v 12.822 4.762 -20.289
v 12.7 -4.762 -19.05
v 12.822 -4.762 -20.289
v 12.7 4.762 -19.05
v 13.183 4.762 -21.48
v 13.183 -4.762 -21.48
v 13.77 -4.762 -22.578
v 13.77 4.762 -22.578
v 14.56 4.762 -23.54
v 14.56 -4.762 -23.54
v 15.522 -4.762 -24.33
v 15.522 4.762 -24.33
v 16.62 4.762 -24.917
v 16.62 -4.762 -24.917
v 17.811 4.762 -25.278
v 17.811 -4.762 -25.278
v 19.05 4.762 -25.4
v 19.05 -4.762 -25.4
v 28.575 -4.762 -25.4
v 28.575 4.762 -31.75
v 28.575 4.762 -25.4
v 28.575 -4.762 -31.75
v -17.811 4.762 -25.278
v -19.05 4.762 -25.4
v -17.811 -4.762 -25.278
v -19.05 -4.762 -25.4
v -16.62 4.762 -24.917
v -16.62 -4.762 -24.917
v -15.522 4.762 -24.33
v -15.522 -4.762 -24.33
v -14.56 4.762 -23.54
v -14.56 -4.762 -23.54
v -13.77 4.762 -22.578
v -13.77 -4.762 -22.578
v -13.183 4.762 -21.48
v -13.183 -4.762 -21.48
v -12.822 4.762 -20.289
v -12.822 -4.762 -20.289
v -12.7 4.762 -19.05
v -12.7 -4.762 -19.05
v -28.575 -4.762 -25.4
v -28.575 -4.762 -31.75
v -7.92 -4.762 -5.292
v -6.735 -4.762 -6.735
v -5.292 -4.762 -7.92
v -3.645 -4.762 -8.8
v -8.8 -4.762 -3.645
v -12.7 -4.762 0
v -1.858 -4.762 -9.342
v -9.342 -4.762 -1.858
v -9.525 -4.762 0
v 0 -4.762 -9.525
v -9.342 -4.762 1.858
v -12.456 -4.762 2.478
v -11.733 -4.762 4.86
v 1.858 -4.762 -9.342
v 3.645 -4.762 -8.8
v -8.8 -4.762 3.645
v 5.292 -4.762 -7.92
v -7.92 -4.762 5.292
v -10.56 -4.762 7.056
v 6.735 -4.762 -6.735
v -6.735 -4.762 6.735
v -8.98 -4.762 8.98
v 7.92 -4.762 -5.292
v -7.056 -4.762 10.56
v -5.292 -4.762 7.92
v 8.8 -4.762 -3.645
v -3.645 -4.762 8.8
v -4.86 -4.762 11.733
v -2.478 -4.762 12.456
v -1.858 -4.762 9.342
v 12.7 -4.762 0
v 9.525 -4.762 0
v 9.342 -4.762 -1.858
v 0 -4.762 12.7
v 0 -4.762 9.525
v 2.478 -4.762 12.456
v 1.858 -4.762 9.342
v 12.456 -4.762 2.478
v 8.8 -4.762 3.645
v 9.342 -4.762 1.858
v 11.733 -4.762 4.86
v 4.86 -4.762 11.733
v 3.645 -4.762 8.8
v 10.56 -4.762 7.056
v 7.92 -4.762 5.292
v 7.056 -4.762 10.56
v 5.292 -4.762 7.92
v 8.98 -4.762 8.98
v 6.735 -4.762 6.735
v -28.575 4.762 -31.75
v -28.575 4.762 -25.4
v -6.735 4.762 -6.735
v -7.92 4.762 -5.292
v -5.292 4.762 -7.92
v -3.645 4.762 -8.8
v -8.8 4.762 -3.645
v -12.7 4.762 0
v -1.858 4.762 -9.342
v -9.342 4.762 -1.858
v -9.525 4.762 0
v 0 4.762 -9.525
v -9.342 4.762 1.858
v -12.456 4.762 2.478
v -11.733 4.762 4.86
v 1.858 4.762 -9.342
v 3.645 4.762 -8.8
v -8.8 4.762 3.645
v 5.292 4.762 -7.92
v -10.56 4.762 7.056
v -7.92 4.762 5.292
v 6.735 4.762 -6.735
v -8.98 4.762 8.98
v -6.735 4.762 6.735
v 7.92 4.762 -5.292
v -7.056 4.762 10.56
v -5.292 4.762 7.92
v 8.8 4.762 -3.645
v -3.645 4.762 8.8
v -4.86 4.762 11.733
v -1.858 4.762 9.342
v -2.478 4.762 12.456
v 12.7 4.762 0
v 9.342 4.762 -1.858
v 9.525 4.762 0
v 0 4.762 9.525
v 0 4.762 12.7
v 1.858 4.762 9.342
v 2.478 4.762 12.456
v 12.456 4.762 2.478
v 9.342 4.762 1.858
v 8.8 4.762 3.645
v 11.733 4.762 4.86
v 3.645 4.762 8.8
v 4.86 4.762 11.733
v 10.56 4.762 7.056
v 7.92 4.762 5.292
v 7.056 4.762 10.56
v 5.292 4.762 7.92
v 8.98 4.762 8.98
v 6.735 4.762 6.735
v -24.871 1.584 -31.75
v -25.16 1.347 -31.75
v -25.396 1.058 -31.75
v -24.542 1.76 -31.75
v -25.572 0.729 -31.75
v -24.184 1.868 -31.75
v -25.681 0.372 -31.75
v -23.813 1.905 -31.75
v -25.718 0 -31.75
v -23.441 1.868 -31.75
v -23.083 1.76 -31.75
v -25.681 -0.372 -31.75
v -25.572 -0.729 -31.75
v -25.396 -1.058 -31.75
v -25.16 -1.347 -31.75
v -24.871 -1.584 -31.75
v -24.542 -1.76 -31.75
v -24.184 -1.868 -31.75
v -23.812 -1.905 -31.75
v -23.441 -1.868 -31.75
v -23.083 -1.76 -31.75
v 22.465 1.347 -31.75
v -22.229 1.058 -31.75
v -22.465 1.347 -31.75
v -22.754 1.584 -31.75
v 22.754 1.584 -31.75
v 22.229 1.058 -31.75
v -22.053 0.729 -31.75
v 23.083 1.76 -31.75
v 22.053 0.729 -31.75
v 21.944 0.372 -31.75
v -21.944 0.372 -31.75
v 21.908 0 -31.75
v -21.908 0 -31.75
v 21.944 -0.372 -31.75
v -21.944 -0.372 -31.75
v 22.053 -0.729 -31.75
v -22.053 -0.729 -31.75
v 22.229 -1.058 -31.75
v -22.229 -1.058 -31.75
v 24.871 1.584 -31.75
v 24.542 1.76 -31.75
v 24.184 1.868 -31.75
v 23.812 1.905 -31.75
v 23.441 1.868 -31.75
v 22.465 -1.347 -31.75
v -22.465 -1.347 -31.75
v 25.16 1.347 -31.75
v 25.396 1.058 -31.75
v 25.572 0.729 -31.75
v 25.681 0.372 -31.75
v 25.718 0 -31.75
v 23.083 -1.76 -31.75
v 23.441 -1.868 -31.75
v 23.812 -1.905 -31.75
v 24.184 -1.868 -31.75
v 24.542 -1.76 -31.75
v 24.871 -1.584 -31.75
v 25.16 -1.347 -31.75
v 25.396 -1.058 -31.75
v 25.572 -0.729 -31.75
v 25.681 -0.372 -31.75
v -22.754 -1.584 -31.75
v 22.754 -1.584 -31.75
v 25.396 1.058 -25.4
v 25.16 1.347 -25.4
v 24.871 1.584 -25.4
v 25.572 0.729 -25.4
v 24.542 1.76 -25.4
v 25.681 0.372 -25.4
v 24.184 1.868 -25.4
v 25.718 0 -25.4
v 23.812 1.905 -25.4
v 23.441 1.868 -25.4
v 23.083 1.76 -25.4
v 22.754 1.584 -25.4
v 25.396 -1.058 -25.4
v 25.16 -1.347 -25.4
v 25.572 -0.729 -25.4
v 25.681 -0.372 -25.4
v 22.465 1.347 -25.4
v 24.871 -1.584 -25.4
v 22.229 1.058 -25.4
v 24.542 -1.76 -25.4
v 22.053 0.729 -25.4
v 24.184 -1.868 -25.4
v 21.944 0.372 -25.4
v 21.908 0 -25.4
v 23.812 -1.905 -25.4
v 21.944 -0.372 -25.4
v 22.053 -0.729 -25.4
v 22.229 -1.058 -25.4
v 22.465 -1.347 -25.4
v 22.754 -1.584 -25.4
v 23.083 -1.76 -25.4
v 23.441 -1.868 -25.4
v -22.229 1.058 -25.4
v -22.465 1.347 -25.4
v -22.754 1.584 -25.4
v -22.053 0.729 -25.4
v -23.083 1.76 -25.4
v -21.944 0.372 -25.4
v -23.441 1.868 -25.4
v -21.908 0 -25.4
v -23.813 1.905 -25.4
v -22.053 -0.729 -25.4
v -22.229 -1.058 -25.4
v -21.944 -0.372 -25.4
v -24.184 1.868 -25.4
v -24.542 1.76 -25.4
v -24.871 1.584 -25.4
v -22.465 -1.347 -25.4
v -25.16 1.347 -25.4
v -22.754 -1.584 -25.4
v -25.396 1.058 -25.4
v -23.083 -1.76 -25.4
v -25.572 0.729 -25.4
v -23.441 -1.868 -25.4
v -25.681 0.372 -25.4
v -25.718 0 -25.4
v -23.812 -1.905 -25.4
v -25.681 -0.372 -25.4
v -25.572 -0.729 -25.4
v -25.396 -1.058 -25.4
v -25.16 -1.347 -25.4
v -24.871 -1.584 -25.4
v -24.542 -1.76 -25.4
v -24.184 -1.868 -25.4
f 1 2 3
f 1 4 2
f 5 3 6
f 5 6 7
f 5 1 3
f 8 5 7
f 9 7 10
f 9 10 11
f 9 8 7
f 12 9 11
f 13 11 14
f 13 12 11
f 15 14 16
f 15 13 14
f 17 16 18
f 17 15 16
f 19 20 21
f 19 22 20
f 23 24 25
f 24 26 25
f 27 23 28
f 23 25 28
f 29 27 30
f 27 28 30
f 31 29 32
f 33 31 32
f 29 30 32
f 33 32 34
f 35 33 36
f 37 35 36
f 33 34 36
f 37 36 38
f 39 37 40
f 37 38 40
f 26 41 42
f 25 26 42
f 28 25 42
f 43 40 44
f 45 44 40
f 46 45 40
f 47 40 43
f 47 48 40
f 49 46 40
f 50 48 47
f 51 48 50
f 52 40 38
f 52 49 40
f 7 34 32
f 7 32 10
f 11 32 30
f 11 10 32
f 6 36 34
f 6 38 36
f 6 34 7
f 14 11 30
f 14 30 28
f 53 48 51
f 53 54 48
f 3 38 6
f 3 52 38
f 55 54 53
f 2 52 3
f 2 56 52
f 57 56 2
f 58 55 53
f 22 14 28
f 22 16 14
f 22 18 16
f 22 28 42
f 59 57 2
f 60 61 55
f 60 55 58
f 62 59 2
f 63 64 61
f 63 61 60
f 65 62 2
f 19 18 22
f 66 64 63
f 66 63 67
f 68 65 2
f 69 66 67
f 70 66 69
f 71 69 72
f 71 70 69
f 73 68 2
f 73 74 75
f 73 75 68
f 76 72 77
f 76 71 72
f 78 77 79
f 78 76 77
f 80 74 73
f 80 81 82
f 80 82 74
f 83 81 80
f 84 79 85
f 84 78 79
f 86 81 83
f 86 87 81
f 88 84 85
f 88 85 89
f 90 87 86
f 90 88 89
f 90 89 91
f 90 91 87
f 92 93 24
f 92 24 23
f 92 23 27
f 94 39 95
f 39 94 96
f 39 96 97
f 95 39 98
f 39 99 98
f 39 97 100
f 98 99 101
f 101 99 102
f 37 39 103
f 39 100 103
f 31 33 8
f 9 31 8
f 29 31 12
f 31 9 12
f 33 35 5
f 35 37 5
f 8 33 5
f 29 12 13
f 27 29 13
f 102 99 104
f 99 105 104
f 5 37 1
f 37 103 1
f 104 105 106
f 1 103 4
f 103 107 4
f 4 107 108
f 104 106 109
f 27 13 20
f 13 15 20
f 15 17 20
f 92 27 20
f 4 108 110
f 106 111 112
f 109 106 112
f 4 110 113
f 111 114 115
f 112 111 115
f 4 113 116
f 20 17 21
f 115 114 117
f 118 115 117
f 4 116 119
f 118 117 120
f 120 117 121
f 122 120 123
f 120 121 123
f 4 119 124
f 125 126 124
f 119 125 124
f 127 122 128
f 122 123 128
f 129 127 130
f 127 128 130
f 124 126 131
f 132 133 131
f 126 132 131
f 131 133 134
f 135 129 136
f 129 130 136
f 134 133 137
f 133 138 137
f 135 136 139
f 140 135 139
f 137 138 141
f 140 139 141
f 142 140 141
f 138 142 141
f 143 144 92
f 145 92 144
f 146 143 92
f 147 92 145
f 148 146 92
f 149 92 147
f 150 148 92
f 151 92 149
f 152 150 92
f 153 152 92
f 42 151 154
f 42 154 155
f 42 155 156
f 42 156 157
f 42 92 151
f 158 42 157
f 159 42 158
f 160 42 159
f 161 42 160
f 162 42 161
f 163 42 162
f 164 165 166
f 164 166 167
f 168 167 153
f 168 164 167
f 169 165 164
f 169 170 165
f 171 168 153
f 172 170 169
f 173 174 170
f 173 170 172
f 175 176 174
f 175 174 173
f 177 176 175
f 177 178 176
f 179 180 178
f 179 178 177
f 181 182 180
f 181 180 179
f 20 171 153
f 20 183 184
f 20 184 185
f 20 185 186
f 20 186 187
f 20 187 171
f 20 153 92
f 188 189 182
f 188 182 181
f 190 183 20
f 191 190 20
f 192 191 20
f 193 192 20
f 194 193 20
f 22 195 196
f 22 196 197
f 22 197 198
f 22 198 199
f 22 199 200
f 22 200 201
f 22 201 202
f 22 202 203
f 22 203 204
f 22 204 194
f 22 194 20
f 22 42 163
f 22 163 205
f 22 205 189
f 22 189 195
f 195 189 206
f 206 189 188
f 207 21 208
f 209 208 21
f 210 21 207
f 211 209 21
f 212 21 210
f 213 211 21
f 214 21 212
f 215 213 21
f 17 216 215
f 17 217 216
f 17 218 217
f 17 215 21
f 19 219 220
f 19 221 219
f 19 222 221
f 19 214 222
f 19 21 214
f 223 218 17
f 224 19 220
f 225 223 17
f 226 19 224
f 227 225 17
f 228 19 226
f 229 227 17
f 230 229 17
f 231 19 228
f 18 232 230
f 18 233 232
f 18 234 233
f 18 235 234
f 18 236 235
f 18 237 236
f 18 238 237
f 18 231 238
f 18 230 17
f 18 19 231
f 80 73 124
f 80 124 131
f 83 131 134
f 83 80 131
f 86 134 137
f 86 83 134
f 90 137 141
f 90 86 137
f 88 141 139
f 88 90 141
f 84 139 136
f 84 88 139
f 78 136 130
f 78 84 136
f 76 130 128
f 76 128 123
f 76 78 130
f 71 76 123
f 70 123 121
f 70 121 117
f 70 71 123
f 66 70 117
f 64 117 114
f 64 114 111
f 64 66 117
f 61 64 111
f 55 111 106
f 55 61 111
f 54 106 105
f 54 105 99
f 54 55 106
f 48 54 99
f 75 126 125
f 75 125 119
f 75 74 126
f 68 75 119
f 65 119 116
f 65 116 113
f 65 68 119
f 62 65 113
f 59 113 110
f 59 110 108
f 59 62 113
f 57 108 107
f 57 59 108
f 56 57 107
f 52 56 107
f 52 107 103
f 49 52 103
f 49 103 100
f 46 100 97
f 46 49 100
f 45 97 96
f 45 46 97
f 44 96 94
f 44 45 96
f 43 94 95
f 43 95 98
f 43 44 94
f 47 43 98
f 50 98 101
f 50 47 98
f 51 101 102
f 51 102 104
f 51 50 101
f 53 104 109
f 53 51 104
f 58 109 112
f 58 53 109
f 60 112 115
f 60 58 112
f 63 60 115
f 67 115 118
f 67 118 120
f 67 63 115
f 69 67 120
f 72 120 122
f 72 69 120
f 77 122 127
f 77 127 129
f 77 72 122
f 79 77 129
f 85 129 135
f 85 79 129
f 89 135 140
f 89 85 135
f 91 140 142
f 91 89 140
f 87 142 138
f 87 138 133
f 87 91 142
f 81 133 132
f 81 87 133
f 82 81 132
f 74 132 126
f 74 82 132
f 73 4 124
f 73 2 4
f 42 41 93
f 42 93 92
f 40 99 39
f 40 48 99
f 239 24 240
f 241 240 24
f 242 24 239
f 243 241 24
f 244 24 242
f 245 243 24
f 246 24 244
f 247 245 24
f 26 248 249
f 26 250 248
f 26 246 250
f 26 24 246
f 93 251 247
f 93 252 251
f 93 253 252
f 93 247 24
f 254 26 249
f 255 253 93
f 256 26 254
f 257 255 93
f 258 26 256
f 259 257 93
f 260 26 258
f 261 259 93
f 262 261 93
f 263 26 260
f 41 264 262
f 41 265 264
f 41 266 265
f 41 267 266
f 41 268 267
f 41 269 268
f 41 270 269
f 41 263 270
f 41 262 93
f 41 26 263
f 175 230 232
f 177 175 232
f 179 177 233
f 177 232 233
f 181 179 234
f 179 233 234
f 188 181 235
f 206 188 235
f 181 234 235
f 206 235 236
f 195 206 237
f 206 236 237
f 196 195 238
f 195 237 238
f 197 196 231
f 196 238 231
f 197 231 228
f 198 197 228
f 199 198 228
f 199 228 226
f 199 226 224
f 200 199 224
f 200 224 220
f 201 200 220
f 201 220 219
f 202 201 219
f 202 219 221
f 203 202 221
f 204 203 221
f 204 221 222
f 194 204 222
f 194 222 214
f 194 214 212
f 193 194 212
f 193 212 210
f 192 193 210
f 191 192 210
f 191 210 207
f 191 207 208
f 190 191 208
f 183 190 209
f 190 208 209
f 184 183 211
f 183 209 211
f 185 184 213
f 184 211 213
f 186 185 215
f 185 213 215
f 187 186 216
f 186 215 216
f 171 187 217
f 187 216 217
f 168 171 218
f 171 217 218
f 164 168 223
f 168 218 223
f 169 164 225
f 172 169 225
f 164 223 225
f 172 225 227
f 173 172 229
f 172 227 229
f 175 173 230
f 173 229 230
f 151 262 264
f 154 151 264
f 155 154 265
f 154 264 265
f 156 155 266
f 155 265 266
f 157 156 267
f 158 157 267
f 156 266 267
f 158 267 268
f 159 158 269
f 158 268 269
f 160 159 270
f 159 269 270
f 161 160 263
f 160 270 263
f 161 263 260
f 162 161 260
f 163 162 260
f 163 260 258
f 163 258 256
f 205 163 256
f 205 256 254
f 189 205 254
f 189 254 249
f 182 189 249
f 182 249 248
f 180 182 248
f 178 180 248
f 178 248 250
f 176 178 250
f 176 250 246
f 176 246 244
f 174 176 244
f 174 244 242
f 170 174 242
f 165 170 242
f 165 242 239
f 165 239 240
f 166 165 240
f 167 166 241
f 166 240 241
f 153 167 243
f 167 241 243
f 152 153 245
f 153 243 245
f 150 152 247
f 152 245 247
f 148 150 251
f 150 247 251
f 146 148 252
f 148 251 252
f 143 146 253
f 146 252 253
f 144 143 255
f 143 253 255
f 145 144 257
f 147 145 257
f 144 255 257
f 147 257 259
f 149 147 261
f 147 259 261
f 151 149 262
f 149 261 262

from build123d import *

# Parameters (mm, degrees)
F1_DEPTH = 4.7625
F2_R     = 6.35
F4_D     = 3.81


with BuildPart() as f1:
    # F0 (on Front) → F1 (new body, symmetric)
    with BuildSketch(Plane.XZ):
        with BuildLine():
            Line((12.7, -25.4), (12.7, 0))
            ThreePointArc((12.7, 0), (0, 12.7), (-12.7, 0))
            Line((-12.7, 0), (-12.7, -25.4))
            Line((-12.7, -25.4), (-28.575, -25.4))
            Line((-28.575, -25.4), (-28.575, -31.75))
            Line((-28.575, -31.75), (28.575, -31.75))
            Line((28.575, -31.75), (28.575, -25.4))
            Line((28.575, -25.4), (12.7, -25.4))
        make_face()
        with BuildLine():
            ThreePointArc((-9.525, 1e-08), (5e-09, 9.525), (9.525, 0))
            ThreePointArc((9.525, 0), (-5e-09, -9.525), (-9.525, 1e-08))
        make_face(mode=Mode.SUBTRACT)
    extrude(amount=F1_DEPTH, both=True)

    # F2
    f2_edges = [f1.edges().sort_by_distance(p)[0] for p in [
        (-12.7, 0, -25.4),
        (12.7, 0, -25.4),
    ]]
    fillet(f2_edges, radius=F2_R)

    # F4 (through all)
    with Locations(Plane(origin=(0, 0, -31.75), x_dir=(1, 0, 0), z_dir=(0, 0, -1))):
        with Locations((-23.8125, 0), (23.8125, 0)):
            Hole(F4_D / 2)


solid = f1.part
